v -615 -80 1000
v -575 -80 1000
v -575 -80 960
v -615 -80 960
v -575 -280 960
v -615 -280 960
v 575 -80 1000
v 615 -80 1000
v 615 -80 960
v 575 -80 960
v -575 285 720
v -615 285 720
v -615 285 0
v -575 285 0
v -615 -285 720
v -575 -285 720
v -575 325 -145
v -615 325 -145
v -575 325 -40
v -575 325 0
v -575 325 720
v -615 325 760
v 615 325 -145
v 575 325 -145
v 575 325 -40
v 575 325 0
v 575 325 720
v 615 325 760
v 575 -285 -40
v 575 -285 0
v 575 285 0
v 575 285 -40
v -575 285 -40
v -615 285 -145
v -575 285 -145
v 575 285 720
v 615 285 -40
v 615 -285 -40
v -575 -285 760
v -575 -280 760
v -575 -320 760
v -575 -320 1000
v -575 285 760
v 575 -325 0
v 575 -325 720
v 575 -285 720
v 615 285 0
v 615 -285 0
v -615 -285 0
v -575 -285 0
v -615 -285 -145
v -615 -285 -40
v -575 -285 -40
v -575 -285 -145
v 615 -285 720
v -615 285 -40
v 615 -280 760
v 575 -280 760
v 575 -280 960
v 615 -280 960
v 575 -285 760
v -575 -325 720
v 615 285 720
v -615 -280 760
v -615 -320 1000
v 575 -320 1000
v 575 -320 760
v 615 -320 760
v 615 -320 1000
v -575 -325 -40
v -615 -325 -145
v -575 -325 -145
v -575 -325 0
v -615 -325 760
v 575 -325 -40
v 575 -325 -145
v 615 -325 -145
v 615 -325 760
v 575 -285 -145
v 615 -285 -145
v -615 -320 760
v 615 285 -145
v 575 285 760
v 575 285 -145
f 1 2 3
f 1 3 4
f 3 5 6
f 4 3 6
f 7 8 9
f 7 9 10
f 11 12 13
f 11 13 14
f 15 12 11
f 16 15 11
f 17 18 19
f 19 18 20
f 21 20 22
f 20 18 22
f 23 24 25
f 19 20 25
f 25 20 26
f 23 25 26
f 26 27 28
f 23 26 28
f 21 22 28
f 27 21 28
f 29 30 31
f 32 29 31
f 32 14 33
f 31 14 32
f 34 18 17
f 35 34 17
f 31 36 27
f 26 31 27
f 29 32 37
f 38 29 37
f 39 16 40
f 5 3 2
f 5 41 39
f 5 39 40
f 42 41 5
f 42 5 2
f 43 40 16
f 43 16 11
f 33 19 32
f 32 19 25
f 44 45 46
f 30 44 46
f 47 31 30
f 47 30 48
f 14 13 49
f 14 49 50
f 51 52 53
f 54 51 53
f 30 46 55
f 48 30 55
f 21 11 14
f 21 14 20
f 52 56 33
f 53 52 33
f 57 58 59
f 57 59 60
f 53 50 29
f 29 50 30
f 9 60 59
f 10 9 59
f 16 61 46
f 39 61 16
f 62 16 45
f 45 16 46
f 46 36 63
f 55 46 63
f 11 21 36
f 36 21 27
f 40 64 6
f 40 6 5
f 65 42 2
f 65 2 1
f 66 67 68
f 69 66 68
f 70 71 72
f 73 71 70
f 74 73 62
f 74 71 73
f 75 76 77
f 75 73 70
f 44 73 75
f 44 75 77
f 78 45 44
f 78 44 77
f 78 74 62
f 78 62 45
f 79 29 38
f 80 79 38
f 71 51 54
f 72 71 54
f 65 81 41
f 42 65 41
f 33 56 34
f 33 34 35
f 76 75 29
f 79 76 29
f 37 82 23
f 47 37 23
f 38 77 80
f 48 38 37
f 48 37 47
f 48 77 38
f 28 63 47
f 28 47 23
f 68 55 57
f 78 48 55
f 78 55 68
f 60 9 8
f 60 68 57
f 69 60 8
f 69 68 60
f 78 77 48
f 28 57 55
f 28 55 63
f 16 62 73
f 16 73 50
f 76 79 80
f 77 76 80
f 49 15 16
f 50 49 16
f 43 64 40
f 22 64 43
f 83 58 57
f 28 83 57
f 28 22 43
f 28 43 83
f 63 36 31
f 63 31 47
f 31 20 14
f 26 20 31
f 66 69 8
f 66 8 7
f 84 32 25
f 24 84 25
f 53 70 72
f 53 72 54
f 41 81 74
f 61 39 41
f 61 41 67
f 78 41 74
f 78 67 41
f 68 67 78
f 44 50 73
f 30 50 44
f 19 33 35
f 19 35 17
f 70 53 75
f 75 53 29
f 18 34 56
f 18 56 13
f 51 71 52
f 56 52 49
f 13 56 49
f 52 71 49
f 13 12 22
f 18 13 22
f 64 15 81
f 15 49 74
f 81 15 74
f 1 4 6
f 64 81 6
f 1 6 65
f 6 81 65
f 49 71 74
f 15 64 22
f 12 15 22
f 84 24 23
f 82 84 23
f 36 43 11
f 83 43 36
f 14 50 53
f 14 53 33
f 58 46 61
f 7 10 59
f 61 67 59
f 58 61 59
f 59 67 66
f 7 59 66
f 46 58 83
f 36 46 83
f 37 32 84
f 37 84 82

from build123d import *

# Parameters (mm, degrees)
F0_W          = 40
F0_H          = 40
F1_DEPTH      = 760
F1_DEPTH_BACK = 145
F2_W          = 1150
F2_H          = 40
F2_W_2        = 40
F2_H_2        = 565
F2_H_3        = 5
F3_DEPTH      = 40
F0_W_2        = 1150
F0_H_2        = 570
F4_DEPTH      = 40
F2_H_4        = 35
F5_DEPTH      = 240
F6_W          = 40
F6_H          = 40
F7_DEPTH      = 200
F8_W          = 40
F8_H          = 40
F9_DEPTH      = 200


with BuildPart() as f1:
    # F0 (on Top) → F1 (new body, two sides)
    with BuildSketch(Plane.XY) as f1_sk:
        with Locations((595, 305)):
            Rectangle(F0_W, F0_H)
    extrude(amount=F1_DEPTH)
    extrude(f1_sk.sketch, amount=-F1_DEPTH_BACK)



with BuildPart() as f1b:
    # F0 (on Top) → F1, piece 2 (new body, two sides)
    with BuildSketch(Plane.XY) as f1_2_sk:
        with Locations((-595, 305)):
            Rectangle(F0_W, F0_H)
    extrude(amount=F1_DEPTH)
    extrude(f1_2_sk.sketch, amount=-F1_DEPTH_BACK)


with BuildPart() as f1c:
    # F0 (on Top) → F1, piece 3 (new body, two sides)
    with BuildSketch(Plane.XY) as f1_3_sk:
        with Locations((-595, -305)):
            Rectangle(F0_W, F0_H)
    extrude(amount=F1_DEPTH)
    extrude(f1_3_sk.sketch, amount=-F1_DEPTH_BACK)


with BuildPart() as f1d:
    # F0 (on Top) → F1, piece 4 (new body, two sides)
    with BuildSketch(Plane.XY) as f1_4_sk:
        with Locations((595, -305)):
            Rectangle(F0_W, F0_H)
    extrude(amount=F1_DEPTH)
    extrude(f1_4_sk.sketch, amount=-F1_DEPTH_BACK)


with BuildPart() as f1_1:
    add(f1.part)

    add(f1b.part)  # F3 merges F1b

    add(f1c.part)  # F3 merges F1c

    add(f1d.part)  # F3 merges F1d
    # F2 (on face) → F3 (join)
    with BuildSketch(Plane.XY.offset(760)):
        with Locations((0, 305)):
            Rectangle(F2_W, F2_H)
        with Locations((595, 2.5)):
            Rectangle(F2_W_2, F2_H_2)
        Polygon((-575, -325), (575, -325), (575, -320), (575, -285), (-575, -285), (-575, -320), align=None)
        with Locations((-595, 2.5)):
            Rectangle(F2_W_2, F2_H_2)
        with Locations((-595, -282.5)):
            Rectangle(F2_W_2, F2_H_3)
        with Locations((595, -282.5)):
            Rectangle(F2_W_2, F2_H_3)
    extrude(amount=-F3_DEPTH)

    # F0 (on Top) → F4 (join)
    with BuildSketch(Plane.XY):
        with Locations((0, -305)):
            Rectangle(F0_W_2, F0_H)
        with Locations((595, 0)):
            Rectangle(F0_W, F0_H_2)
        with Locations((0, 305)):
            Rectangle(F0_W_2, F0_H)
        with Locations((-595, 0)):
            Rectangle(F0_W, F0_H_2)
    extrude(amount=-F4_DEPTH)

    # F2 (on face) → F5 (join)
    with BuildSketch(Plane.XY.offset(760)):
        with Locations((-595, -302.5)):
            Rectangle(F2_W_2, F2_H_4)
        with Locations((-595, -282.5)):
            Rectangle(F2_W_2, F2_H_3)
        with Locations((595, -302.5)):
            Rectangle(F2_W_2, F2_H_4)
        with Locations((595, -282.5)):
            Rectangle(F2_W_2, F2_H_3)
    extrude(amount=F5_DEPTH)

    # F6 (on face) → F7 (join)
    with BuildSketch(Plane(origin=(0, -280, 0), x_dir=(-1, 0, 0), z_dir=(0, 1, 0))):
        with Locations((-595, 980)):
            Rectangle(F6_W, F6_H)
    extrude(amount=F7_DEPTH)

    # F8 (on face) → F9 (join)
    with BuildSketch(Plane(origin=(0, -280, 0), x_dir=(-1, 0, 0), z_dir=(0, 1, 0))):
        with Locations((595, 980)):
            Rectangle(F8_W, F8_H)
    extrude(amount=F9_DEPTH)


solid = f1_1.part
